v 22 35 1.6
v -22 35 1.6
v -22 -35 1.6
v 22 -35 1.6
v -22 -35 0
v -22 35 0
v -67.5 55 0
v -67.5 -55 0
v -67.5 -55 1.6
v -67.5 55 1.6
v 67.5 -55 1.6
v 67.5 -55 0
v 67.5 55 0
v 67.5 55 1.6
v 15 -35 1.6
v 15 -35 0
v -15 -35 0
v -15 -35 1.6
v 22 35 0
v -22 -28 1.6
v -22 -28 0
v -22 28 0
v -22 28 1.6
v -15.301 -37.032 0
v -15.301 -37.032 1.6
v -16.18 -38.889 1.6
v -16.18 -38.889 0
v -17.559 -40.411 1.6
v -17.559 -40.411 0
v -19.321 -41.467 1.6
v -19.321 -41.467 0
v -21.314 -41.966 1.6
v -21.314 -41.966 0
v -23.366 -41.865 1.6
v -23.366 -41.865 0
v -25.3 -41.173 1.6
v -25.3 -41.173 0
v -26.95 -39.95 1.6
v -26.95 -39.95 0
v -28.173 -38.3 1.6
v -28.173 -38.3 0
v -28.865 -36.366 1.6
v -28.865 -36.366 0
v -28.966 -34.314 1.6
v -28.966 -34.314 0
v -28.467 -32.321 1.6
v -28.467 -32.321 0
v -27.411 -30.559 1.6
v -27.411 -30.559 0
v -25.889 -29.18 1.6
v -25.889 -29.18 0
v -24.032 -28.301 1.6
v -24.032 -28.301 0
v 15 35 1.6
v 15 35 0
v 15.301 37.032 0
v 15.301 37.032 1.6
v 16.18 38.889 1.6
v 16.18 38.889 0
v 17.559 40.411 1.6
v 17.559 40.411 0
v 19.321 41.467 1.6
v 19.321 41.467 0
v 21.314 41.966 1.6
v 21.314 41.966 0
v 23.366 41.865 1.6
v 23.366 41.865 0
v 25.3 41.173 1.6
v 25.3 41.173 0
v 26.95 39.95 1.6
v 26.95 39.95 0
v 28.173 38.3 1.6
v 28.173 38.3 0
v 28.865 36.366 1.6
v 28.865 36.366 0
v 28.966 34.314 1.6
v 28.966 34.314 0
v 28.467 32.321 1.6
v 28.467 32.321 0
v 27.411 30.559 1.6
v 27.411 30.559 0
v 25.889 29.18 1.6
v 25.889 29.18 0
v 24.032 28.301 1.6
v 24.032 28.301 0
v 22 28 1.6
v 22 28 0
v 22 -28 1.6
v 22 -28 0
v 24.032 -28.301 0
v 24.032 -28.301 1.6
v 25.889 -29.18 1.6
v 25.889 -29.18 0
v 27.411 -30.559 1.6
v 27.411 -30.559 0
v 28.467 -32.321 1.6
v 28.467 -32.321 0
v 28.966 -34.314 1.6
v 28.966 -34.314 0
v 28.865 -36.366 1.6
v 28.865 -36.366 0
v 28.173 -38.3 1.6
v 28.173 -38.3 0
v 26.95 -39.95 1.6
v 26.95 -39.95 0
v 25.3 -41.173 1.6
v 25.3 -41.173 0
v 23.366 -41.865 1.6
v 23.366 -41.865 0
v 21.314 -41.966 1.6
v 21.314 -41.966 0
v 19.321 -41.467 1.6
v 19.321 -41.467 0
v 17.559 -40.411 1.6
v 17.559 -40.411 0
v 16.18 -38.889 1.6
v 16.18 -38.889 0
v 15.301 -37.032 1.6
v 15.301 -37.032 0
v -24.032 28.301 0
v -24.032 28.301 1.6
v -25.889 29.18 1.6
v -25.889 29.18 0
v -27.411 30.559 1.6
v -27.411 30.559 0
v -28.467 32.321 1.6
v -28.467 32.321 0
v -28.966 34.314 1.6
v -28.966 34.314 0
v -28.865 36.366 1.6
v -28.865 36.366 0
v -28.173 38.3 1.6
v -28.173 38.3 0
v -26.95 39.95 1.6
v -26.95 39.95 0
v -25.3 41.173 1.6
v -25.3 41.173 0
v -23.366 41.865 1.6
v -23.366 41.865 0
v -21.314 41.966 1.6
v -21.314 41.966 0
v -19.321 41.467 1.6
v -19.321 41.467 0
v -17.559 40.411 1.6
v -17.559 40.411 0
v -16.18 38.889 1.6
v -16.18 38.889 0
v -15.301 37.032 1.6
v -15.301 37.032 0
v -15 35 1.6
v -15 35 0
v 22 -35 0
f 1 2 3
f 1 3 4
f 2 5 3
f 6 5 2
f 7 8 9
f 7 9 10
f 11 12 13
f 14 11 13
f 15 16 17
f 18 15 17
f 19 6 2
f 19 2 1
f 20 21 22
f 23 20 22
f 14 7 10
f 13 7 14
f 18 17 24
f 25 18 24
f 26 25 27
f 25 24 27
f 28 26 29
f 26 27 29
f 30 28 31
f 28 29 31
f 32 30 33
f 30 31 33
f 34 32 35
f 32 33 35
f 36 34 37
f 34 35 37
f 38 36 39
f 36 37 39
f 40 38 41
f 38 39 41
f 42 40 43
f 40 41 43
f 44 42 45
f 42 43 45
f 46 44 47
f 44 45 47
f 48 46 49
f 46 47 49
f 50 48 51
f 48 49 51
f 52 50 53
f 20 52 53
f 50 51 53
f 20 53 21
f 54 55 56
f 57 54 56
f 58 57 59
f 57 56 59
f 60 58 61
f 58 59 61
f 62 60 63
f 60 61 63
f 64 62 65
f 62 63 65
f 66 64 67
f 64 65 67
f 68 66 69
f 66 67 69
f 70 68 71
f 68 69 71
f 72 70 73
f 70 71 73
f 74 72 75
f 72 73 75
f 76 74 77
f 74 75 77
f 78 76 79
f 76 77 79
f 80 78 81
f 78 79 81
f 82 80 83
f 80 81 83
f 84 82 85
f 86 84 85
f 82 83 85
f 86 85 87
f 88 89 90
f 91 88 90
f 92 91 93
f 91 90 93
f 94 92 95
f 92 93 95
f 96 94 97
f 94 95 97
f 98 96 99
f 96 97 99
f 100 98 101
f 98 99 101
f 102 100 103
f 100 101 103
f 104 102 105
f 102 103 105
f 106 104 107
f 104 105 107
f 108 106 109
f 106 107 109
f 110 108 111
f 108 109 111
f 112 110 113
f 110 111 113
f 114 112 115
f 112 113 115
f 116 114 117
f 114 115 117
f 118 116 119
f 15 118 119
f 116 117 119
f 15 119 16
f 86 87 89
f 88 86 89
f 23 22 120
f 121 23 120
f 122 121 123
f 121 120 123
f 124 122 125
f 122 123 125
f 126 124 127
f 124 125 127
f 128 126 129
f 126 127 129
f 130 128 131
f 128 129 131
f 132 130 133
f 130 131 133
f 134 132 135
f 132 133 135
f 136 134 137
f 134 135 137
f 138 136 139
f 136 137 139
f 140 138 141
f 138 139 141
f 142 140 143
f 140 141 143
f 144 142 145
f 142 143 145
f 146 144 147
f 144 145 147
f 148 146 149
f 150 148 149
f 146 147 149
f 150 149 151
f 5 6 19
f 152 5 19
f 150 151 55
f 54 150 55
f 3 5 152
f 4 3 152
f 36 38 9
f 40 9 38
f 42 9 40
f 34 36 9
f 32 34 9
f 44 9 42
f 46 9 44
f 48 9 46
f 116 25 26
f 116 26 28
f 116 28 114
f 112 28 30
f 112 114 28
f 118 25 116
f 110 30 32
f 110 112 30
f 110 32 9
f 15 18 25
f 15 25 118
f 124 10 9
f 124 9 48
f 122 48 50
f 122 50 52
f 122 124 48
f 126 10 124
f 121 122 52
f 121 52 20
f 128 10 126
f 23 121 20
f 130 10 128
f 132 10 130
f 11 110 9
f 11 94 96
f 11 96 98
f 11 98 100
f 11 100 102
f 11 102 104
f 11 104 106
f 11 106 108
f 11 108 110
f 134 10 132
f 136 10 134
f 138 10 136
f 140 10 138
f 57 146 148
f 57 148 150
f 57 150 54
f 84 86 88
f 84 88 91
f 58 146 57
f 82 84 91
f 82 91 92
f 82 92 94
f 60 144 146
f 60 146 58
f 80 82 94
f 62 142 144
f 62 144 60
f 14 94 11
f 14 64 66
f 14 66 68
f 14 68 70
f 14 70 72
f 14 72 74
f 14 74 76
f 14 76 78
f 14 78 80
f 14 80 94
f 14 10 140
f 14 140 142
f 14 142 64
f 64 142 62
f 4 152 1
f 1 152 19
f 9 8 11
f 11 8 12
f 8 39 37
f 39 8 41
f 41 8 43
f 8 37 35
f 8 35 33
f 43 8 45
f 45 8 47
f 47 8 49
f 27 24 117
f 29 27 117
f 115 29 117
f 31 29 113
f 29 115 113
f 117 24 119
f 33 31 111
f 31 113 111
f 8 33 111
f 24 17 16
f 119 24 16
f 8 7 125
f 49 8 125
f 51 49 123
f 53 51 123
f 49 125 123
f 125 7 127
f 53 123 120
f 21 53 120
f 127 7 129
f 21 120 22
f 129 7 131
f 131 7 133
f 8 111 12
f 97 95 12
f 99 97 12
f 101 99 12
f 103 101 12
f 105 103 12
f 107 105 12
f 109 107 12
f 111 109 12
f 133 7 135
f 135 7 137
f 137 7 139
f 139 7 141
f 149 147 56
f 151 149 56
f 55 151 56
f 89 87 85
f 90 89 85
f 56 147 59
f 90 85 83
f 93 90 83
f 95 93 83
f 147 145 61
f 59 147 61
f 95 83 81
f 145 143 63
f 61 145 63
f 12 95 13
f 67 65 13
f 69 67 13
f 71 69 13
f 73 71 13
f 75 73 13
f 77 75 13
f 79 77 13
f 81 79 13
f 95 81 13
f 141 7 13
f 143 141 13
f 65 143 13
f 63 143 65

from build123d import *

# Parameters (mm, degrees)
F0_W     = 44
F0_H     = 70
F1_DEPTH = 1.6
F2_W     = 135
F2_H     = 110
F3_DEPTH = 1.6


with BuildPart() as f1:
    # F0 (on Top) → F1 (new body)
    with BuildSketch(Plane.XY):
        Rectangle(F0_W, F0_H)
    extrude(amount=F1_DEPTH)


with BuildPart() as f3:
    # F2 (on Top) → F3 (new body)
    with BuildSketch(Plane.XY):
        Rectangle(F2_W, F2_H)
        with BuildLine():
            Line((-22, -28), (-22, 28))
            ThreePointArc((-22, 28), (-26.949747, 39.949747), (-15, 35))
            Line((-15, 35), (15, 35))
            ThreePointArc((15, 35), (26.949747, 39.949747), (22, 28))
            Line((22, 28), (22, -28))
            ThreePointArc((22, -28), (26.949747, -39.949747), (15, -35))
            Line((15, -35), (-15, -35))
            ThreePointArc((-15, -35), (-26.949747, -39.949747), (-22, -28))
        make_face(mode=Mode.SUBTRACT)
    extrude(amount=F3_DEPTH)


solid = Compound([f1.part, f3.part])
